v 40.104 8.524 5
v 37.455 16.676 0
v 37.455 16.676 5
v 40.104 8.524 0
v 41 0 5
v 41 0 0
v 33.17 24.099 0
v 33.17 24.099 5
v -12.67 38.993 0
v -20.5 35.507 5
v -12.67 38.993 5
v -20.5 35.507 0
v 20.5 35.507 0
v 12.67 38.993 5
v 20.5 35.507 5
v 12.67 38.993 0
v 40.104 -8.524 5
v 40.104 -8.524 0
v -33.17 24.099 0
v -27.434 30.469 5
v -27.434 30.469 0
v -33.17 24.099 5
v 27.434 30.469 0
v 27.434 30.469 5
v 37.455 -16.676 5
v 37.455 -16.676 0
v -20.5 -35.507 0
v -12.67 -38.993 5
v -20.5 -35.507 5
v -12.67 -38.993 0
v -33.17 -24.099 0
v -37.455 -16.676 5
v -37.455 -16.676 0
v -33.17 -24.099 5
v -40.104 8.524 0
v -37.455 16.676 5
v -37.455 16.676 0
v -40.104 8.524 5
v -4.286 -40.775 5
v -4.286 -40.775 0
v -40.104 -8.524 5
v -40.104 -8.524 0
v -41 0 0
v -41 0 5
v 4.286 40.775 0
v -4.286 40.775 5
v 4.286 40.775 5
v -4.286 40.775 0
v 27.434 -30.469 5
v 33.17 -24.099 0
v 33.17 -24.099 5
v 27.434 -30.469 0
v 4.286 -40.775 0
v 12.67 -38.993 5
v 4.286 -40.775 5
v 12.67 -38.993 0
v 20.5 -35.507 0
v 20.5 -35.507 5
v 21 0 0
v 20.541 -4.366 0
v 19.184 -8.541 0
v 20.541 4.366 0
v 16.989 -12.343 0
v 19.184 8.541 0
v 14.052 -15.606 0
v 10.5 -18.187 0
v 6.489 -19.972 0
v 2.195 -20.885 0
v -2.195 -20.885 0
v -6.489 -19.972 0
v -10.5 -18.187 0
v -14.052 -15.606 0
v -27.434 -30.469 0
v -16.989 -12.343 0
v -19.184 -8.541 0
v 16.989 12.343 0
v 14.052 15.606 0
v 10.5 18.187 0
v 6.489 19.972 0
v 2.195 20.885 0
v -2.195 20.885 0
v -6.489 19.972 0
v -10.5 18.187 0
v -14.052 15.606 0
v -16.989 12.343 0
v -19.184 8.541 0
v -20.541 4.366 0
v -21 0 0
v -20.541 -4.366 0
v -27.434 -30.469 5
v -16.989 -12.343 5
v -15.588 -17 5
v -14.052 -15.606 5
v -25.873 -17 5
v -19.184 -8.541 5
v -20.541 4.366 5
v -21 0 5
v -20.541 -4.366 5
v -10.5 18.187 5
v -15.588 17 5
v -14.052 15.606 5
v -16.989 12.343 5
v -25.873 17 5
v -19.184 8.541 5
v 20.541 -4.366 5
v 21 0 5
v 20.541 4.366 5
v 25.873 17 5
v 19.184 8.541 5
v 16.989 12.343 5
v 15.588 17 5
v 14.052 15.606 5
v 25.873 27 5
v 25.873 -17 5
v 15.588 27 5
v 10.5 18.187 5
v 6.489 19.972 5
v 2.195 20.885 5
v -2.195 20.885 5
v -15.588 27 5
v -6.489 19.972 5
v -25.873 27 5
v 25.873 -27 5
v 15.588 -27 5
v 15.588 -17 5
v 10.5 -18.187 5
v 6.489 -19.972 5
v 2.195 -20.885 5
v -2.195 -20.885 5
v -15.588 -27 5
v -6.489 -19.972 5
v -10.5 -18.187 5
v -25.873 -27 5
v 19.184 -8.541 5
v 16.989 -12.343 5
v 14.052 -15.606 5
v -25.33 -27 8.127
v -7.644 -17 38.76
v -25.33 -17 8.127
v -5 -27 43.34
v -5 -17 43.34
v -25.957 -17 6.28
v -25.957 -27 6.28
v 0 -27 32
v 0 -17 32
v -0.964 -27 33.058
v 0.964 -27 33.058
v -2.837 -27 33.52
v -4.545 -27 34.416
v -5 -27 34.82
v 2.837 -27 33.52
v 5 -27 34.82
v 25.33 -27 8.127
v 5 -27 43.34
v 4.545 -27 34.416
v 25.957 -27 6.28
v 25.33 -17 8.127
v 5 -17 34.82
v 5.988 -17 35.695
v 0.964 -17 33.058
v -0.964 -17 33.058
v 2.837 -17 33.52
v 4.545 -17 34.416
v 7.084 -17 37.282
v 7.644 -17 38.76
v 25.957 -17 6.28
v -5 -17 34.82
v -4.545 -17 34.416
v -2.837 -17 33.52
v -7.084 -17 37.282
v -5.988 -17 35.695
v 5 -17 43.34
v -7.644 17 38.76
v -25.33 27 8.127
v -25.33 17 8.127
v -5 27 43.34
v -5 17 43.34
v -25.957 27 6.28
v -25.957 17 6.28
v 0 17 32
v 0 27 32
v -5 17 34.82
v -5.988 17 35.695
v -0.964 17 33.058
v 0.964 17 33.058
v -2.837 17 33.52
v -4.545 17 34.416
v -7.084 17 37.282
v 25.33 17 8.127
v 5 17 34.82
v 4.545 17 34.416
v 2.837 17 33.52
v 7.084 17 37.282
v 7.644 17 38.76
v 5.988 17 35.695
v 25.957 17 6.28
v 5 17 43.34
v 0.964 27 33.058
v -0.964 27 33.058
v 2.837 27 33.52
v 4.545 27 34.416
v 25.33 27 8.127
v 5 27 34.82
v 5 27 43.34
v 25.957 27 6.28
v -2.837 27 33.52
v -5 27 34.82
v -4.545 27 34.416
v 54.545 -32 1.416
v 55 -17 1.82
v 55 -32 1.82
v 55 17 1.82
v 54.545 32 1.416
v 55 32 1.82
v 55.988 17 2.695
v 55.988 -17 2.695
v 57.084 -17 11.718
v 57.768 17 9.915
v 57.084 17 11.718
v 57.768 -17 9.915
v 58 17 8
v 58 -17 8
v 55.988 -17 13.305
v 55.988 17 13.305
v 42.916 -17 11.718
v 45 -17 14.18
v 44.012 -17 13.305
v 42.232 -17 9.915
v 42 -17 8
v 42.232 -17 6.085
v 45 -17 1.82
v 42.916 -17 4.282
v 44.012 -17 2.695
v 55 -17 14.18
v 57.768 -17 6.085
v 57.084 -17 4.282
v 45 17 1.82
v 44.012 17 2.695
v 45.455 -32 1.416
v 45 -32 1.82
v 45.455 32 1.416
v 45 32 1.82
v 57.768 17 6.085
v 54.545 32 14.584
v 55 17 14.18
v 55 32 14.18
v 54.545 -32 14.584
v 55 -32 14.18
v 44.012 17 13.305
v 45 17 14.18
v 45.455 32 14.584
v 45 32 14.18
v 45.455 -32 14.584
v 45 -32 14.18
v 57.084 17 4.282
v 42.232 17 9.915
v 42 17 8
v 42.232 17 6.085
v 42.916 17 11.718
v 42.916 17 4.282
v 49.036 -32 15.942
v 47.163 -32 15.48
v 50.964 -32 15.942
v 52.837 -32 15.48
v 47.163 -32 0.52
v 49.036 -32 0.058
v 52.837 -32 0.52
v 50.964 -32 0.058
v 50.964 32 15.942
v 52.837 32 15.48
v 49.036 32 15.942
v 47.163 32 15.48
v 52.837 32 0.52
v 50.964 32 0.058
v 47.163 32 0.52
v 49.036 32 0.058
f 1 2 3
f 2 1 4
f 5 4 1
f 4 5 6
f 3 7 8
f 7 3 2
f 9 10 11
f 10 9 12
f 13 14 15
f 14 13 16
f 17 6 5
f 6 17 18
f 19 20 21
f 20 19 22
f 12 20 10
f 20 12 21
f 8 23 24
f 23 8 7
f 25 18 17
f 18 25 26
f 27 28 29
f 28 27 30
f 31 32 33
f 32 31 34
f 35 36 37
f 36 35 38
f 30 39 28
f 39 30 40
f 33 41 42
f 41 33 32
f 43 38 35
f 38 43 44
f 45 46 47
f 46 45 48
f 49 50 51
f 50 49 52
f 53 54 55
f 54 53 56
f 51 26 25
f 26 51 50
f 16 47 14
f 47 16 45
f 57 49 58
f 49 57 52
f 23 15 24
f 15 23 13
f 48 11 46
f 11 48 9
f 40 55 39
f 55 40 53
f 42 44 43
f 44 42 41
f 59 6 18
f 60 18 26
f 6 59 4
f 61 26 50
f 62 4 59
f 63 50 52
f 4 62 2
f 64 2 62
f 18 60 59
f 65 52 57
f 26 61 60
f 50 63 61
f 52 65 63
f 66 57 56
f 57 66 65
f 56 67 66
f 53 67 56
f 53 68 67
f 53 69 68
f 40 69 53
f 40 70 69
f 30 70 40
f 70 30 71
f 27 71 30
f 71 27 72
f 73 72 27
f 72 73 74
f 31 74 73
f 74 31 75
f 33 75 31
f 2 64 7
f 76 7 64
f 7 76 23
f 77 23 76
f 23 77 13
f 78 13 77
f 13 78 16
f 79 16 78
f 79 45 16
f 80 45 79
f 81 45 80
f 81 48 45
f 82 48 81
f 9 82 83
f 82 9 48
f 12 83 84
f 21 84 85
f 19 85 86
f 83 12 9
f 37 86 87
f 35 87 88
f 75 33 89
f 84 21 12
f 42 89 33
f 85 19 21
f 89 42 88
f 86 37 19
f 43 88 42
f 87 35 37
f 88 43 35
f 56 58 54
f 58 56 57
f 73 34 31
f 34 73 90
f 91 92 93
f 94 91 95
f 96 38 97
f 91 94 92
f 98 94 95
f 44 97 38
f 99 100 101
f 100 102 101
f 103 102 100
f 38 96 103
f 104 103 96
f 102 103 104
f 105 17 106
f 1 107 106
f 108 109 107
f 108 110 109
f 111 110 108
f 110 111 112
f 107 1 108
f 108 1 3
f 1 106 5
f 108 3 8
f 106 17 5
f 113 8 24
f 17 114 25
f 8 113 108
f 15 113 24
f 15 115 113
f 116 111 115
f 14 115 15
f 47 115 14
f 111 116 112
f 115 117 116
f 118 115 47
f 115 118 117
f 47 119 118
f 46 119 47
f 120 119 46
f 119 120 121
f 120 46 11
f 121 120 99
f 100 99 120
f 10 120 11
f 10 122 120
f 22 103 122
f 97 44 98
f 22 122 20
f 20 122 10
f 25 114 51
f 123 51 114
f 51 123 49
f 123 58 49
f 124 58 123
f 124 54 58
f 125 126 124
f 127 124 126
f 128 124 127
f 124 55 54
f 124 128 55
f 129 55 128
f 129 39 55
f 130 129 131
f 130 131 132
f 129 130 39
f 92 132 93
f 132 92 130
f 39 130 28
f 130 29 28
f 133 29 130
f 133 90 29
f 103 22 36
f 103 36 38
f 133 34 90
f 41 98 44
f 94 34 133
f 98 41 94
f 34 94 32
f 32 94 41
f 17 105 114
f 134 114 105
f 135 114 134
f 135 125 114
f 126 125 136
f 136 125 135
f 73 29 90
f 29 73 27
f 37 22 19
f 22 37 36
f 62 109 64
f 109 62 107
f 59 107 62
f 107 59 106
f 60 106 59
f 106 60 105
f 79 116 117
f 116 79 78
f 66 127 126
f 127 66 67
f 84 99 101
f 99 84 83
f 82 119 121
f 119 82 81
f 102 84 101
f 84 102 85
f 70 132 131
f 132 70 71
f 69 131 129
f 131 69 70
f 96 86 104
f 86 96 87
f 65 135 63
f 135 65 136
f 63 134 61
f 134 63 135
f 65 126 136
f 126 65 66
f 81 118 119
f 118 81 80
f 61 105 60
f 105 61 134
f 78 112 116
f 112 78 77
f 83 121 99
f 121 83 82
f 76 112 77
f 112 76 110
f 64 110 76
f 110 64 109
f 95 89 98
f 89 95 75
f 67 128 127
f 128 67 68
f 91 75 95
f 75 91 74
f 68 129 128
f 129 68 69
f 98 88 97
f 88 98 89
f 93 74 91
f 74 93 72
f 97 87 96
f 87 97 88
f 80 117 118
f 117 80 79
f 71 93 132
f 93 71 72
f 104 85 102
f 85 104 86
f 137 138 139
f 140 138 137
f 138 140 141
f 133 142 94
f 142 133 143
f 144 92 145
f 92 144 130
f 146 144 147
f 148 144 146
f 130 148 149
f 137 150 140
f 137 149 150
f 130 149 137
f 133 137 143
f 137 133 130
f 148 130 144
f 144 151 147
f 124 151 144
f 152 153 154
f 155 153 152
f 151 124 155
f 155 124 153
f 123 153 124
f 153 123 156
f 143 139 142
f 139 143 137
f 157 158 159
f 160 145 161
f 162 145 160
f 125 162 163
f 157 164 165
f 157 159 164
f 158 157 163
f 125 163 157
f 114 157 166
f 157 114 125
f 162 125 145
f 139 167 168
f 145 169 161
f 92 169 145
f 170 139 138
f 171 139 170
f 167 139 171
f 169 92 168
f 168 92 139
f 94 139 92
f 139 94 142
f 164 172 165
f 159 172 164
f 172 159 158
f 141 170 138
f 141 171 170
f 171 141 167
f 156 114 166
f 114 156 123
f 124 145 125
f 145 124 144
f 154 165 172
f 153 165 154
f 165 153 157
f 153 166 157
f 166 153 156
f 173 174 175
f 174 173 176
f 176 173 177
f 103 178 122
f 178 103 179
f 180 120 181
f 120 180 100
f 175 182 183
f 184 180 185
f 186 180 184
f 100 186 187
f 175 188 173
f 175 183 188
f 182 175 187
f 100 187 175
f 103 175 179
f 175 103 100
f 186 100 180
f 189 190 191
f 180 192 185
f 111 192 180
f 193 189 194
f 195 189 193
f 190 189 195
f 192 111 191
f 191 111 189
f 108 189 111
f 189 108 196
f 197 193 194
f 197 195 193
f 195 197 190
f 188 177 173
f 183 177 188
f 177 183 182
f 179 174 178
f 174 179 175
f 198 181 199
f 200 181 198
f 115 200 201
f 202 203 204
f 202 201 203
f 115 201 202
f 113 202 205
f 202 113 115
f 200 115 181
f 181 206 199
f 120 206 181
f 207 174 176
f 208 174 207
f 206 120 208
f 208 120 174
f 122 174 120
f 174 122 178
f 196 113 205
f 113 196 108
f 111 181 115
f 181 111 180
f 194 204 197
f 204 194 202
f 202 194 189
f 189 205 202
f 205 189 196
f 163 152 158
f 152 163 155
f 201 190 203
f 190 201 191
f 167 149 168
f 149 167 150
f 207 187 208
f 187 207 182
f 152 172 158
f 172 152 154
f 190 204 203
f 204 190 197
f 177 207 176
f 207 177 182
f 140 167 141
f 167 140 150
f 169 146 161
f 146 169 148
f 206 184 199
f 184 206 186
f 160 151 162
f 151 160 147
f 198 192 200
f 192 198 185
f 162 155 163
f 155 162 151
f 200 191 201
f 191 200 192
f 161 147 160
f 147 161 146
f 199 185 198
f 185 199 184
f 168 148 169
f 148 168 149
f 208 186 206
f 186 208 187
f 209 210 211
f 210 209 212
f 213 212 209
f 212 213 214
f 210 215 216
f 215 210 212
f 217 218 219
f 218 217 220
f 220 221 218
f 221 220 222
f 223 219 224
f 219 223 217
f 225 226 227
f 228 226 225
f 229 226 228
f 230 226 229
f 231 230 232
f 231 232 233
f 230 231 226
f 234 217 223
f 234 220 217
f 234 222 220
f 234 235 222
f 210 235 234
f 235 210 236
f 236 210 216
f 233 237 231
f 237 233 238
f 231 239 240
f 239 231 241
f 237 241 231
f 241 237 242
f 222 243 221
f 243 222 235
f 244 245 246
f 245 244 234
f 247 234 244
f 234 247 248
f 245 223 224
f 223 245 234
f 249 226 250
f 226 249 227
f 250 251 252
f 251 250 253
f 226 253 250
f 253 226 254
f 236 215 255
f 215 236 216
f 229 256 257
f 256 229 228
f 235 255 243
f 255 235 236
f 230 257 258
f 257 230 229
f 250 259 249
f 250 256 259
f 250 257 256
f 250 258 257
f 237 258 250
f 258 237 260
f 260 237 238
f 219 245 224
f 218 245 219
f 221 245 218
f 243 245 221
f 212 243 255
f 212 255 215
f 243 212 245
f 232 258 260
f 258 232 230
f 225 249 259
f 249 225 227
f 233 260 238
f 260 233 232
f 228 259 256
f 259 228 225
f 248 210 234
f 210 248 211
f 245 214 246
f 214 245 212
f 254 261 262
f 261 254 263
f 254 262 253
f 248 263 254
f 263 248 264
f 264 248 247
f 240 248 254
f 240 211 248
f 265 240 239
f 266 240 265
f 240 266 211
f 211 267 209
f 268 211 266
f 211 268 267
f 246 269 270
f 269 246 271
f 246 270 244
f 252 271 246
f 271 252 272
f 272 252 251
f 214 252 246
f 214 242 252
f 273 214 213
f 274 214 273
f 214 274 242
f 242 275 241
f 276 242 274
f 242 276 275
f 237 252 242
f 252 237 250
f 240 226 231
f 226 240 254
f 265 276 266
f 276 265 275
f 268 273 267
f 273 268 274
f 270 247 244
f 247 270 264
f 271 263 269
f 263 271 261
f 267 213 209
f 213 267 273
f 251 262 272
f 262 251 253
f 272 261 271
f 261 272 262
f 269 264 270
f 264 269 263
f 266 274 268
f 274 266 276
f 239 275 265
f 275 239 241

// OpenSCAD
module edge(l) {
    hull() {
        cylinder(r=5,h=10);
        translate([l,0,0])
        cylinder(r=5,h=10);
    }
}

module side(l) {
    union() {
        edge(l);
        rotate(240)
        mirror()
        edge(l);
    }
}

module base(r, d){
    difference(){
        cylinder(r=r, h=d);
        translate([0,0,-1])
        cylinder(r=r-20, h=d+2);
    }
}

side_length = 42;
pin_length = 34;

module pin(r, h) {
    intersection(){
        union(){
            cylinder(r=r, h=h);
            translate([-5,-10,-15])
            cube([10,20,h+30]);
        }
        translate([0,0,-20])
        cylinder(r=r, h=h+40);
    }
}

union(){
    base(41, 5);
    lift = 42;
    difference(){
        union(){
            translate([0, -pin_length/2, lift])
            rotate([90,120,0])
            side(side_length);
            translate([0, pin_length/2+10, lift])
            rotate([90,120,0])
            side(side_length);
        }
        translate([0,pin_length/2,41])
        rotate([90,0,0])
        pin(r=8, h=pin_length);
    }
}

translate([50,pin_length/2,8])
rotate([90,0,0])
pin(r=8, h=pin_length);
